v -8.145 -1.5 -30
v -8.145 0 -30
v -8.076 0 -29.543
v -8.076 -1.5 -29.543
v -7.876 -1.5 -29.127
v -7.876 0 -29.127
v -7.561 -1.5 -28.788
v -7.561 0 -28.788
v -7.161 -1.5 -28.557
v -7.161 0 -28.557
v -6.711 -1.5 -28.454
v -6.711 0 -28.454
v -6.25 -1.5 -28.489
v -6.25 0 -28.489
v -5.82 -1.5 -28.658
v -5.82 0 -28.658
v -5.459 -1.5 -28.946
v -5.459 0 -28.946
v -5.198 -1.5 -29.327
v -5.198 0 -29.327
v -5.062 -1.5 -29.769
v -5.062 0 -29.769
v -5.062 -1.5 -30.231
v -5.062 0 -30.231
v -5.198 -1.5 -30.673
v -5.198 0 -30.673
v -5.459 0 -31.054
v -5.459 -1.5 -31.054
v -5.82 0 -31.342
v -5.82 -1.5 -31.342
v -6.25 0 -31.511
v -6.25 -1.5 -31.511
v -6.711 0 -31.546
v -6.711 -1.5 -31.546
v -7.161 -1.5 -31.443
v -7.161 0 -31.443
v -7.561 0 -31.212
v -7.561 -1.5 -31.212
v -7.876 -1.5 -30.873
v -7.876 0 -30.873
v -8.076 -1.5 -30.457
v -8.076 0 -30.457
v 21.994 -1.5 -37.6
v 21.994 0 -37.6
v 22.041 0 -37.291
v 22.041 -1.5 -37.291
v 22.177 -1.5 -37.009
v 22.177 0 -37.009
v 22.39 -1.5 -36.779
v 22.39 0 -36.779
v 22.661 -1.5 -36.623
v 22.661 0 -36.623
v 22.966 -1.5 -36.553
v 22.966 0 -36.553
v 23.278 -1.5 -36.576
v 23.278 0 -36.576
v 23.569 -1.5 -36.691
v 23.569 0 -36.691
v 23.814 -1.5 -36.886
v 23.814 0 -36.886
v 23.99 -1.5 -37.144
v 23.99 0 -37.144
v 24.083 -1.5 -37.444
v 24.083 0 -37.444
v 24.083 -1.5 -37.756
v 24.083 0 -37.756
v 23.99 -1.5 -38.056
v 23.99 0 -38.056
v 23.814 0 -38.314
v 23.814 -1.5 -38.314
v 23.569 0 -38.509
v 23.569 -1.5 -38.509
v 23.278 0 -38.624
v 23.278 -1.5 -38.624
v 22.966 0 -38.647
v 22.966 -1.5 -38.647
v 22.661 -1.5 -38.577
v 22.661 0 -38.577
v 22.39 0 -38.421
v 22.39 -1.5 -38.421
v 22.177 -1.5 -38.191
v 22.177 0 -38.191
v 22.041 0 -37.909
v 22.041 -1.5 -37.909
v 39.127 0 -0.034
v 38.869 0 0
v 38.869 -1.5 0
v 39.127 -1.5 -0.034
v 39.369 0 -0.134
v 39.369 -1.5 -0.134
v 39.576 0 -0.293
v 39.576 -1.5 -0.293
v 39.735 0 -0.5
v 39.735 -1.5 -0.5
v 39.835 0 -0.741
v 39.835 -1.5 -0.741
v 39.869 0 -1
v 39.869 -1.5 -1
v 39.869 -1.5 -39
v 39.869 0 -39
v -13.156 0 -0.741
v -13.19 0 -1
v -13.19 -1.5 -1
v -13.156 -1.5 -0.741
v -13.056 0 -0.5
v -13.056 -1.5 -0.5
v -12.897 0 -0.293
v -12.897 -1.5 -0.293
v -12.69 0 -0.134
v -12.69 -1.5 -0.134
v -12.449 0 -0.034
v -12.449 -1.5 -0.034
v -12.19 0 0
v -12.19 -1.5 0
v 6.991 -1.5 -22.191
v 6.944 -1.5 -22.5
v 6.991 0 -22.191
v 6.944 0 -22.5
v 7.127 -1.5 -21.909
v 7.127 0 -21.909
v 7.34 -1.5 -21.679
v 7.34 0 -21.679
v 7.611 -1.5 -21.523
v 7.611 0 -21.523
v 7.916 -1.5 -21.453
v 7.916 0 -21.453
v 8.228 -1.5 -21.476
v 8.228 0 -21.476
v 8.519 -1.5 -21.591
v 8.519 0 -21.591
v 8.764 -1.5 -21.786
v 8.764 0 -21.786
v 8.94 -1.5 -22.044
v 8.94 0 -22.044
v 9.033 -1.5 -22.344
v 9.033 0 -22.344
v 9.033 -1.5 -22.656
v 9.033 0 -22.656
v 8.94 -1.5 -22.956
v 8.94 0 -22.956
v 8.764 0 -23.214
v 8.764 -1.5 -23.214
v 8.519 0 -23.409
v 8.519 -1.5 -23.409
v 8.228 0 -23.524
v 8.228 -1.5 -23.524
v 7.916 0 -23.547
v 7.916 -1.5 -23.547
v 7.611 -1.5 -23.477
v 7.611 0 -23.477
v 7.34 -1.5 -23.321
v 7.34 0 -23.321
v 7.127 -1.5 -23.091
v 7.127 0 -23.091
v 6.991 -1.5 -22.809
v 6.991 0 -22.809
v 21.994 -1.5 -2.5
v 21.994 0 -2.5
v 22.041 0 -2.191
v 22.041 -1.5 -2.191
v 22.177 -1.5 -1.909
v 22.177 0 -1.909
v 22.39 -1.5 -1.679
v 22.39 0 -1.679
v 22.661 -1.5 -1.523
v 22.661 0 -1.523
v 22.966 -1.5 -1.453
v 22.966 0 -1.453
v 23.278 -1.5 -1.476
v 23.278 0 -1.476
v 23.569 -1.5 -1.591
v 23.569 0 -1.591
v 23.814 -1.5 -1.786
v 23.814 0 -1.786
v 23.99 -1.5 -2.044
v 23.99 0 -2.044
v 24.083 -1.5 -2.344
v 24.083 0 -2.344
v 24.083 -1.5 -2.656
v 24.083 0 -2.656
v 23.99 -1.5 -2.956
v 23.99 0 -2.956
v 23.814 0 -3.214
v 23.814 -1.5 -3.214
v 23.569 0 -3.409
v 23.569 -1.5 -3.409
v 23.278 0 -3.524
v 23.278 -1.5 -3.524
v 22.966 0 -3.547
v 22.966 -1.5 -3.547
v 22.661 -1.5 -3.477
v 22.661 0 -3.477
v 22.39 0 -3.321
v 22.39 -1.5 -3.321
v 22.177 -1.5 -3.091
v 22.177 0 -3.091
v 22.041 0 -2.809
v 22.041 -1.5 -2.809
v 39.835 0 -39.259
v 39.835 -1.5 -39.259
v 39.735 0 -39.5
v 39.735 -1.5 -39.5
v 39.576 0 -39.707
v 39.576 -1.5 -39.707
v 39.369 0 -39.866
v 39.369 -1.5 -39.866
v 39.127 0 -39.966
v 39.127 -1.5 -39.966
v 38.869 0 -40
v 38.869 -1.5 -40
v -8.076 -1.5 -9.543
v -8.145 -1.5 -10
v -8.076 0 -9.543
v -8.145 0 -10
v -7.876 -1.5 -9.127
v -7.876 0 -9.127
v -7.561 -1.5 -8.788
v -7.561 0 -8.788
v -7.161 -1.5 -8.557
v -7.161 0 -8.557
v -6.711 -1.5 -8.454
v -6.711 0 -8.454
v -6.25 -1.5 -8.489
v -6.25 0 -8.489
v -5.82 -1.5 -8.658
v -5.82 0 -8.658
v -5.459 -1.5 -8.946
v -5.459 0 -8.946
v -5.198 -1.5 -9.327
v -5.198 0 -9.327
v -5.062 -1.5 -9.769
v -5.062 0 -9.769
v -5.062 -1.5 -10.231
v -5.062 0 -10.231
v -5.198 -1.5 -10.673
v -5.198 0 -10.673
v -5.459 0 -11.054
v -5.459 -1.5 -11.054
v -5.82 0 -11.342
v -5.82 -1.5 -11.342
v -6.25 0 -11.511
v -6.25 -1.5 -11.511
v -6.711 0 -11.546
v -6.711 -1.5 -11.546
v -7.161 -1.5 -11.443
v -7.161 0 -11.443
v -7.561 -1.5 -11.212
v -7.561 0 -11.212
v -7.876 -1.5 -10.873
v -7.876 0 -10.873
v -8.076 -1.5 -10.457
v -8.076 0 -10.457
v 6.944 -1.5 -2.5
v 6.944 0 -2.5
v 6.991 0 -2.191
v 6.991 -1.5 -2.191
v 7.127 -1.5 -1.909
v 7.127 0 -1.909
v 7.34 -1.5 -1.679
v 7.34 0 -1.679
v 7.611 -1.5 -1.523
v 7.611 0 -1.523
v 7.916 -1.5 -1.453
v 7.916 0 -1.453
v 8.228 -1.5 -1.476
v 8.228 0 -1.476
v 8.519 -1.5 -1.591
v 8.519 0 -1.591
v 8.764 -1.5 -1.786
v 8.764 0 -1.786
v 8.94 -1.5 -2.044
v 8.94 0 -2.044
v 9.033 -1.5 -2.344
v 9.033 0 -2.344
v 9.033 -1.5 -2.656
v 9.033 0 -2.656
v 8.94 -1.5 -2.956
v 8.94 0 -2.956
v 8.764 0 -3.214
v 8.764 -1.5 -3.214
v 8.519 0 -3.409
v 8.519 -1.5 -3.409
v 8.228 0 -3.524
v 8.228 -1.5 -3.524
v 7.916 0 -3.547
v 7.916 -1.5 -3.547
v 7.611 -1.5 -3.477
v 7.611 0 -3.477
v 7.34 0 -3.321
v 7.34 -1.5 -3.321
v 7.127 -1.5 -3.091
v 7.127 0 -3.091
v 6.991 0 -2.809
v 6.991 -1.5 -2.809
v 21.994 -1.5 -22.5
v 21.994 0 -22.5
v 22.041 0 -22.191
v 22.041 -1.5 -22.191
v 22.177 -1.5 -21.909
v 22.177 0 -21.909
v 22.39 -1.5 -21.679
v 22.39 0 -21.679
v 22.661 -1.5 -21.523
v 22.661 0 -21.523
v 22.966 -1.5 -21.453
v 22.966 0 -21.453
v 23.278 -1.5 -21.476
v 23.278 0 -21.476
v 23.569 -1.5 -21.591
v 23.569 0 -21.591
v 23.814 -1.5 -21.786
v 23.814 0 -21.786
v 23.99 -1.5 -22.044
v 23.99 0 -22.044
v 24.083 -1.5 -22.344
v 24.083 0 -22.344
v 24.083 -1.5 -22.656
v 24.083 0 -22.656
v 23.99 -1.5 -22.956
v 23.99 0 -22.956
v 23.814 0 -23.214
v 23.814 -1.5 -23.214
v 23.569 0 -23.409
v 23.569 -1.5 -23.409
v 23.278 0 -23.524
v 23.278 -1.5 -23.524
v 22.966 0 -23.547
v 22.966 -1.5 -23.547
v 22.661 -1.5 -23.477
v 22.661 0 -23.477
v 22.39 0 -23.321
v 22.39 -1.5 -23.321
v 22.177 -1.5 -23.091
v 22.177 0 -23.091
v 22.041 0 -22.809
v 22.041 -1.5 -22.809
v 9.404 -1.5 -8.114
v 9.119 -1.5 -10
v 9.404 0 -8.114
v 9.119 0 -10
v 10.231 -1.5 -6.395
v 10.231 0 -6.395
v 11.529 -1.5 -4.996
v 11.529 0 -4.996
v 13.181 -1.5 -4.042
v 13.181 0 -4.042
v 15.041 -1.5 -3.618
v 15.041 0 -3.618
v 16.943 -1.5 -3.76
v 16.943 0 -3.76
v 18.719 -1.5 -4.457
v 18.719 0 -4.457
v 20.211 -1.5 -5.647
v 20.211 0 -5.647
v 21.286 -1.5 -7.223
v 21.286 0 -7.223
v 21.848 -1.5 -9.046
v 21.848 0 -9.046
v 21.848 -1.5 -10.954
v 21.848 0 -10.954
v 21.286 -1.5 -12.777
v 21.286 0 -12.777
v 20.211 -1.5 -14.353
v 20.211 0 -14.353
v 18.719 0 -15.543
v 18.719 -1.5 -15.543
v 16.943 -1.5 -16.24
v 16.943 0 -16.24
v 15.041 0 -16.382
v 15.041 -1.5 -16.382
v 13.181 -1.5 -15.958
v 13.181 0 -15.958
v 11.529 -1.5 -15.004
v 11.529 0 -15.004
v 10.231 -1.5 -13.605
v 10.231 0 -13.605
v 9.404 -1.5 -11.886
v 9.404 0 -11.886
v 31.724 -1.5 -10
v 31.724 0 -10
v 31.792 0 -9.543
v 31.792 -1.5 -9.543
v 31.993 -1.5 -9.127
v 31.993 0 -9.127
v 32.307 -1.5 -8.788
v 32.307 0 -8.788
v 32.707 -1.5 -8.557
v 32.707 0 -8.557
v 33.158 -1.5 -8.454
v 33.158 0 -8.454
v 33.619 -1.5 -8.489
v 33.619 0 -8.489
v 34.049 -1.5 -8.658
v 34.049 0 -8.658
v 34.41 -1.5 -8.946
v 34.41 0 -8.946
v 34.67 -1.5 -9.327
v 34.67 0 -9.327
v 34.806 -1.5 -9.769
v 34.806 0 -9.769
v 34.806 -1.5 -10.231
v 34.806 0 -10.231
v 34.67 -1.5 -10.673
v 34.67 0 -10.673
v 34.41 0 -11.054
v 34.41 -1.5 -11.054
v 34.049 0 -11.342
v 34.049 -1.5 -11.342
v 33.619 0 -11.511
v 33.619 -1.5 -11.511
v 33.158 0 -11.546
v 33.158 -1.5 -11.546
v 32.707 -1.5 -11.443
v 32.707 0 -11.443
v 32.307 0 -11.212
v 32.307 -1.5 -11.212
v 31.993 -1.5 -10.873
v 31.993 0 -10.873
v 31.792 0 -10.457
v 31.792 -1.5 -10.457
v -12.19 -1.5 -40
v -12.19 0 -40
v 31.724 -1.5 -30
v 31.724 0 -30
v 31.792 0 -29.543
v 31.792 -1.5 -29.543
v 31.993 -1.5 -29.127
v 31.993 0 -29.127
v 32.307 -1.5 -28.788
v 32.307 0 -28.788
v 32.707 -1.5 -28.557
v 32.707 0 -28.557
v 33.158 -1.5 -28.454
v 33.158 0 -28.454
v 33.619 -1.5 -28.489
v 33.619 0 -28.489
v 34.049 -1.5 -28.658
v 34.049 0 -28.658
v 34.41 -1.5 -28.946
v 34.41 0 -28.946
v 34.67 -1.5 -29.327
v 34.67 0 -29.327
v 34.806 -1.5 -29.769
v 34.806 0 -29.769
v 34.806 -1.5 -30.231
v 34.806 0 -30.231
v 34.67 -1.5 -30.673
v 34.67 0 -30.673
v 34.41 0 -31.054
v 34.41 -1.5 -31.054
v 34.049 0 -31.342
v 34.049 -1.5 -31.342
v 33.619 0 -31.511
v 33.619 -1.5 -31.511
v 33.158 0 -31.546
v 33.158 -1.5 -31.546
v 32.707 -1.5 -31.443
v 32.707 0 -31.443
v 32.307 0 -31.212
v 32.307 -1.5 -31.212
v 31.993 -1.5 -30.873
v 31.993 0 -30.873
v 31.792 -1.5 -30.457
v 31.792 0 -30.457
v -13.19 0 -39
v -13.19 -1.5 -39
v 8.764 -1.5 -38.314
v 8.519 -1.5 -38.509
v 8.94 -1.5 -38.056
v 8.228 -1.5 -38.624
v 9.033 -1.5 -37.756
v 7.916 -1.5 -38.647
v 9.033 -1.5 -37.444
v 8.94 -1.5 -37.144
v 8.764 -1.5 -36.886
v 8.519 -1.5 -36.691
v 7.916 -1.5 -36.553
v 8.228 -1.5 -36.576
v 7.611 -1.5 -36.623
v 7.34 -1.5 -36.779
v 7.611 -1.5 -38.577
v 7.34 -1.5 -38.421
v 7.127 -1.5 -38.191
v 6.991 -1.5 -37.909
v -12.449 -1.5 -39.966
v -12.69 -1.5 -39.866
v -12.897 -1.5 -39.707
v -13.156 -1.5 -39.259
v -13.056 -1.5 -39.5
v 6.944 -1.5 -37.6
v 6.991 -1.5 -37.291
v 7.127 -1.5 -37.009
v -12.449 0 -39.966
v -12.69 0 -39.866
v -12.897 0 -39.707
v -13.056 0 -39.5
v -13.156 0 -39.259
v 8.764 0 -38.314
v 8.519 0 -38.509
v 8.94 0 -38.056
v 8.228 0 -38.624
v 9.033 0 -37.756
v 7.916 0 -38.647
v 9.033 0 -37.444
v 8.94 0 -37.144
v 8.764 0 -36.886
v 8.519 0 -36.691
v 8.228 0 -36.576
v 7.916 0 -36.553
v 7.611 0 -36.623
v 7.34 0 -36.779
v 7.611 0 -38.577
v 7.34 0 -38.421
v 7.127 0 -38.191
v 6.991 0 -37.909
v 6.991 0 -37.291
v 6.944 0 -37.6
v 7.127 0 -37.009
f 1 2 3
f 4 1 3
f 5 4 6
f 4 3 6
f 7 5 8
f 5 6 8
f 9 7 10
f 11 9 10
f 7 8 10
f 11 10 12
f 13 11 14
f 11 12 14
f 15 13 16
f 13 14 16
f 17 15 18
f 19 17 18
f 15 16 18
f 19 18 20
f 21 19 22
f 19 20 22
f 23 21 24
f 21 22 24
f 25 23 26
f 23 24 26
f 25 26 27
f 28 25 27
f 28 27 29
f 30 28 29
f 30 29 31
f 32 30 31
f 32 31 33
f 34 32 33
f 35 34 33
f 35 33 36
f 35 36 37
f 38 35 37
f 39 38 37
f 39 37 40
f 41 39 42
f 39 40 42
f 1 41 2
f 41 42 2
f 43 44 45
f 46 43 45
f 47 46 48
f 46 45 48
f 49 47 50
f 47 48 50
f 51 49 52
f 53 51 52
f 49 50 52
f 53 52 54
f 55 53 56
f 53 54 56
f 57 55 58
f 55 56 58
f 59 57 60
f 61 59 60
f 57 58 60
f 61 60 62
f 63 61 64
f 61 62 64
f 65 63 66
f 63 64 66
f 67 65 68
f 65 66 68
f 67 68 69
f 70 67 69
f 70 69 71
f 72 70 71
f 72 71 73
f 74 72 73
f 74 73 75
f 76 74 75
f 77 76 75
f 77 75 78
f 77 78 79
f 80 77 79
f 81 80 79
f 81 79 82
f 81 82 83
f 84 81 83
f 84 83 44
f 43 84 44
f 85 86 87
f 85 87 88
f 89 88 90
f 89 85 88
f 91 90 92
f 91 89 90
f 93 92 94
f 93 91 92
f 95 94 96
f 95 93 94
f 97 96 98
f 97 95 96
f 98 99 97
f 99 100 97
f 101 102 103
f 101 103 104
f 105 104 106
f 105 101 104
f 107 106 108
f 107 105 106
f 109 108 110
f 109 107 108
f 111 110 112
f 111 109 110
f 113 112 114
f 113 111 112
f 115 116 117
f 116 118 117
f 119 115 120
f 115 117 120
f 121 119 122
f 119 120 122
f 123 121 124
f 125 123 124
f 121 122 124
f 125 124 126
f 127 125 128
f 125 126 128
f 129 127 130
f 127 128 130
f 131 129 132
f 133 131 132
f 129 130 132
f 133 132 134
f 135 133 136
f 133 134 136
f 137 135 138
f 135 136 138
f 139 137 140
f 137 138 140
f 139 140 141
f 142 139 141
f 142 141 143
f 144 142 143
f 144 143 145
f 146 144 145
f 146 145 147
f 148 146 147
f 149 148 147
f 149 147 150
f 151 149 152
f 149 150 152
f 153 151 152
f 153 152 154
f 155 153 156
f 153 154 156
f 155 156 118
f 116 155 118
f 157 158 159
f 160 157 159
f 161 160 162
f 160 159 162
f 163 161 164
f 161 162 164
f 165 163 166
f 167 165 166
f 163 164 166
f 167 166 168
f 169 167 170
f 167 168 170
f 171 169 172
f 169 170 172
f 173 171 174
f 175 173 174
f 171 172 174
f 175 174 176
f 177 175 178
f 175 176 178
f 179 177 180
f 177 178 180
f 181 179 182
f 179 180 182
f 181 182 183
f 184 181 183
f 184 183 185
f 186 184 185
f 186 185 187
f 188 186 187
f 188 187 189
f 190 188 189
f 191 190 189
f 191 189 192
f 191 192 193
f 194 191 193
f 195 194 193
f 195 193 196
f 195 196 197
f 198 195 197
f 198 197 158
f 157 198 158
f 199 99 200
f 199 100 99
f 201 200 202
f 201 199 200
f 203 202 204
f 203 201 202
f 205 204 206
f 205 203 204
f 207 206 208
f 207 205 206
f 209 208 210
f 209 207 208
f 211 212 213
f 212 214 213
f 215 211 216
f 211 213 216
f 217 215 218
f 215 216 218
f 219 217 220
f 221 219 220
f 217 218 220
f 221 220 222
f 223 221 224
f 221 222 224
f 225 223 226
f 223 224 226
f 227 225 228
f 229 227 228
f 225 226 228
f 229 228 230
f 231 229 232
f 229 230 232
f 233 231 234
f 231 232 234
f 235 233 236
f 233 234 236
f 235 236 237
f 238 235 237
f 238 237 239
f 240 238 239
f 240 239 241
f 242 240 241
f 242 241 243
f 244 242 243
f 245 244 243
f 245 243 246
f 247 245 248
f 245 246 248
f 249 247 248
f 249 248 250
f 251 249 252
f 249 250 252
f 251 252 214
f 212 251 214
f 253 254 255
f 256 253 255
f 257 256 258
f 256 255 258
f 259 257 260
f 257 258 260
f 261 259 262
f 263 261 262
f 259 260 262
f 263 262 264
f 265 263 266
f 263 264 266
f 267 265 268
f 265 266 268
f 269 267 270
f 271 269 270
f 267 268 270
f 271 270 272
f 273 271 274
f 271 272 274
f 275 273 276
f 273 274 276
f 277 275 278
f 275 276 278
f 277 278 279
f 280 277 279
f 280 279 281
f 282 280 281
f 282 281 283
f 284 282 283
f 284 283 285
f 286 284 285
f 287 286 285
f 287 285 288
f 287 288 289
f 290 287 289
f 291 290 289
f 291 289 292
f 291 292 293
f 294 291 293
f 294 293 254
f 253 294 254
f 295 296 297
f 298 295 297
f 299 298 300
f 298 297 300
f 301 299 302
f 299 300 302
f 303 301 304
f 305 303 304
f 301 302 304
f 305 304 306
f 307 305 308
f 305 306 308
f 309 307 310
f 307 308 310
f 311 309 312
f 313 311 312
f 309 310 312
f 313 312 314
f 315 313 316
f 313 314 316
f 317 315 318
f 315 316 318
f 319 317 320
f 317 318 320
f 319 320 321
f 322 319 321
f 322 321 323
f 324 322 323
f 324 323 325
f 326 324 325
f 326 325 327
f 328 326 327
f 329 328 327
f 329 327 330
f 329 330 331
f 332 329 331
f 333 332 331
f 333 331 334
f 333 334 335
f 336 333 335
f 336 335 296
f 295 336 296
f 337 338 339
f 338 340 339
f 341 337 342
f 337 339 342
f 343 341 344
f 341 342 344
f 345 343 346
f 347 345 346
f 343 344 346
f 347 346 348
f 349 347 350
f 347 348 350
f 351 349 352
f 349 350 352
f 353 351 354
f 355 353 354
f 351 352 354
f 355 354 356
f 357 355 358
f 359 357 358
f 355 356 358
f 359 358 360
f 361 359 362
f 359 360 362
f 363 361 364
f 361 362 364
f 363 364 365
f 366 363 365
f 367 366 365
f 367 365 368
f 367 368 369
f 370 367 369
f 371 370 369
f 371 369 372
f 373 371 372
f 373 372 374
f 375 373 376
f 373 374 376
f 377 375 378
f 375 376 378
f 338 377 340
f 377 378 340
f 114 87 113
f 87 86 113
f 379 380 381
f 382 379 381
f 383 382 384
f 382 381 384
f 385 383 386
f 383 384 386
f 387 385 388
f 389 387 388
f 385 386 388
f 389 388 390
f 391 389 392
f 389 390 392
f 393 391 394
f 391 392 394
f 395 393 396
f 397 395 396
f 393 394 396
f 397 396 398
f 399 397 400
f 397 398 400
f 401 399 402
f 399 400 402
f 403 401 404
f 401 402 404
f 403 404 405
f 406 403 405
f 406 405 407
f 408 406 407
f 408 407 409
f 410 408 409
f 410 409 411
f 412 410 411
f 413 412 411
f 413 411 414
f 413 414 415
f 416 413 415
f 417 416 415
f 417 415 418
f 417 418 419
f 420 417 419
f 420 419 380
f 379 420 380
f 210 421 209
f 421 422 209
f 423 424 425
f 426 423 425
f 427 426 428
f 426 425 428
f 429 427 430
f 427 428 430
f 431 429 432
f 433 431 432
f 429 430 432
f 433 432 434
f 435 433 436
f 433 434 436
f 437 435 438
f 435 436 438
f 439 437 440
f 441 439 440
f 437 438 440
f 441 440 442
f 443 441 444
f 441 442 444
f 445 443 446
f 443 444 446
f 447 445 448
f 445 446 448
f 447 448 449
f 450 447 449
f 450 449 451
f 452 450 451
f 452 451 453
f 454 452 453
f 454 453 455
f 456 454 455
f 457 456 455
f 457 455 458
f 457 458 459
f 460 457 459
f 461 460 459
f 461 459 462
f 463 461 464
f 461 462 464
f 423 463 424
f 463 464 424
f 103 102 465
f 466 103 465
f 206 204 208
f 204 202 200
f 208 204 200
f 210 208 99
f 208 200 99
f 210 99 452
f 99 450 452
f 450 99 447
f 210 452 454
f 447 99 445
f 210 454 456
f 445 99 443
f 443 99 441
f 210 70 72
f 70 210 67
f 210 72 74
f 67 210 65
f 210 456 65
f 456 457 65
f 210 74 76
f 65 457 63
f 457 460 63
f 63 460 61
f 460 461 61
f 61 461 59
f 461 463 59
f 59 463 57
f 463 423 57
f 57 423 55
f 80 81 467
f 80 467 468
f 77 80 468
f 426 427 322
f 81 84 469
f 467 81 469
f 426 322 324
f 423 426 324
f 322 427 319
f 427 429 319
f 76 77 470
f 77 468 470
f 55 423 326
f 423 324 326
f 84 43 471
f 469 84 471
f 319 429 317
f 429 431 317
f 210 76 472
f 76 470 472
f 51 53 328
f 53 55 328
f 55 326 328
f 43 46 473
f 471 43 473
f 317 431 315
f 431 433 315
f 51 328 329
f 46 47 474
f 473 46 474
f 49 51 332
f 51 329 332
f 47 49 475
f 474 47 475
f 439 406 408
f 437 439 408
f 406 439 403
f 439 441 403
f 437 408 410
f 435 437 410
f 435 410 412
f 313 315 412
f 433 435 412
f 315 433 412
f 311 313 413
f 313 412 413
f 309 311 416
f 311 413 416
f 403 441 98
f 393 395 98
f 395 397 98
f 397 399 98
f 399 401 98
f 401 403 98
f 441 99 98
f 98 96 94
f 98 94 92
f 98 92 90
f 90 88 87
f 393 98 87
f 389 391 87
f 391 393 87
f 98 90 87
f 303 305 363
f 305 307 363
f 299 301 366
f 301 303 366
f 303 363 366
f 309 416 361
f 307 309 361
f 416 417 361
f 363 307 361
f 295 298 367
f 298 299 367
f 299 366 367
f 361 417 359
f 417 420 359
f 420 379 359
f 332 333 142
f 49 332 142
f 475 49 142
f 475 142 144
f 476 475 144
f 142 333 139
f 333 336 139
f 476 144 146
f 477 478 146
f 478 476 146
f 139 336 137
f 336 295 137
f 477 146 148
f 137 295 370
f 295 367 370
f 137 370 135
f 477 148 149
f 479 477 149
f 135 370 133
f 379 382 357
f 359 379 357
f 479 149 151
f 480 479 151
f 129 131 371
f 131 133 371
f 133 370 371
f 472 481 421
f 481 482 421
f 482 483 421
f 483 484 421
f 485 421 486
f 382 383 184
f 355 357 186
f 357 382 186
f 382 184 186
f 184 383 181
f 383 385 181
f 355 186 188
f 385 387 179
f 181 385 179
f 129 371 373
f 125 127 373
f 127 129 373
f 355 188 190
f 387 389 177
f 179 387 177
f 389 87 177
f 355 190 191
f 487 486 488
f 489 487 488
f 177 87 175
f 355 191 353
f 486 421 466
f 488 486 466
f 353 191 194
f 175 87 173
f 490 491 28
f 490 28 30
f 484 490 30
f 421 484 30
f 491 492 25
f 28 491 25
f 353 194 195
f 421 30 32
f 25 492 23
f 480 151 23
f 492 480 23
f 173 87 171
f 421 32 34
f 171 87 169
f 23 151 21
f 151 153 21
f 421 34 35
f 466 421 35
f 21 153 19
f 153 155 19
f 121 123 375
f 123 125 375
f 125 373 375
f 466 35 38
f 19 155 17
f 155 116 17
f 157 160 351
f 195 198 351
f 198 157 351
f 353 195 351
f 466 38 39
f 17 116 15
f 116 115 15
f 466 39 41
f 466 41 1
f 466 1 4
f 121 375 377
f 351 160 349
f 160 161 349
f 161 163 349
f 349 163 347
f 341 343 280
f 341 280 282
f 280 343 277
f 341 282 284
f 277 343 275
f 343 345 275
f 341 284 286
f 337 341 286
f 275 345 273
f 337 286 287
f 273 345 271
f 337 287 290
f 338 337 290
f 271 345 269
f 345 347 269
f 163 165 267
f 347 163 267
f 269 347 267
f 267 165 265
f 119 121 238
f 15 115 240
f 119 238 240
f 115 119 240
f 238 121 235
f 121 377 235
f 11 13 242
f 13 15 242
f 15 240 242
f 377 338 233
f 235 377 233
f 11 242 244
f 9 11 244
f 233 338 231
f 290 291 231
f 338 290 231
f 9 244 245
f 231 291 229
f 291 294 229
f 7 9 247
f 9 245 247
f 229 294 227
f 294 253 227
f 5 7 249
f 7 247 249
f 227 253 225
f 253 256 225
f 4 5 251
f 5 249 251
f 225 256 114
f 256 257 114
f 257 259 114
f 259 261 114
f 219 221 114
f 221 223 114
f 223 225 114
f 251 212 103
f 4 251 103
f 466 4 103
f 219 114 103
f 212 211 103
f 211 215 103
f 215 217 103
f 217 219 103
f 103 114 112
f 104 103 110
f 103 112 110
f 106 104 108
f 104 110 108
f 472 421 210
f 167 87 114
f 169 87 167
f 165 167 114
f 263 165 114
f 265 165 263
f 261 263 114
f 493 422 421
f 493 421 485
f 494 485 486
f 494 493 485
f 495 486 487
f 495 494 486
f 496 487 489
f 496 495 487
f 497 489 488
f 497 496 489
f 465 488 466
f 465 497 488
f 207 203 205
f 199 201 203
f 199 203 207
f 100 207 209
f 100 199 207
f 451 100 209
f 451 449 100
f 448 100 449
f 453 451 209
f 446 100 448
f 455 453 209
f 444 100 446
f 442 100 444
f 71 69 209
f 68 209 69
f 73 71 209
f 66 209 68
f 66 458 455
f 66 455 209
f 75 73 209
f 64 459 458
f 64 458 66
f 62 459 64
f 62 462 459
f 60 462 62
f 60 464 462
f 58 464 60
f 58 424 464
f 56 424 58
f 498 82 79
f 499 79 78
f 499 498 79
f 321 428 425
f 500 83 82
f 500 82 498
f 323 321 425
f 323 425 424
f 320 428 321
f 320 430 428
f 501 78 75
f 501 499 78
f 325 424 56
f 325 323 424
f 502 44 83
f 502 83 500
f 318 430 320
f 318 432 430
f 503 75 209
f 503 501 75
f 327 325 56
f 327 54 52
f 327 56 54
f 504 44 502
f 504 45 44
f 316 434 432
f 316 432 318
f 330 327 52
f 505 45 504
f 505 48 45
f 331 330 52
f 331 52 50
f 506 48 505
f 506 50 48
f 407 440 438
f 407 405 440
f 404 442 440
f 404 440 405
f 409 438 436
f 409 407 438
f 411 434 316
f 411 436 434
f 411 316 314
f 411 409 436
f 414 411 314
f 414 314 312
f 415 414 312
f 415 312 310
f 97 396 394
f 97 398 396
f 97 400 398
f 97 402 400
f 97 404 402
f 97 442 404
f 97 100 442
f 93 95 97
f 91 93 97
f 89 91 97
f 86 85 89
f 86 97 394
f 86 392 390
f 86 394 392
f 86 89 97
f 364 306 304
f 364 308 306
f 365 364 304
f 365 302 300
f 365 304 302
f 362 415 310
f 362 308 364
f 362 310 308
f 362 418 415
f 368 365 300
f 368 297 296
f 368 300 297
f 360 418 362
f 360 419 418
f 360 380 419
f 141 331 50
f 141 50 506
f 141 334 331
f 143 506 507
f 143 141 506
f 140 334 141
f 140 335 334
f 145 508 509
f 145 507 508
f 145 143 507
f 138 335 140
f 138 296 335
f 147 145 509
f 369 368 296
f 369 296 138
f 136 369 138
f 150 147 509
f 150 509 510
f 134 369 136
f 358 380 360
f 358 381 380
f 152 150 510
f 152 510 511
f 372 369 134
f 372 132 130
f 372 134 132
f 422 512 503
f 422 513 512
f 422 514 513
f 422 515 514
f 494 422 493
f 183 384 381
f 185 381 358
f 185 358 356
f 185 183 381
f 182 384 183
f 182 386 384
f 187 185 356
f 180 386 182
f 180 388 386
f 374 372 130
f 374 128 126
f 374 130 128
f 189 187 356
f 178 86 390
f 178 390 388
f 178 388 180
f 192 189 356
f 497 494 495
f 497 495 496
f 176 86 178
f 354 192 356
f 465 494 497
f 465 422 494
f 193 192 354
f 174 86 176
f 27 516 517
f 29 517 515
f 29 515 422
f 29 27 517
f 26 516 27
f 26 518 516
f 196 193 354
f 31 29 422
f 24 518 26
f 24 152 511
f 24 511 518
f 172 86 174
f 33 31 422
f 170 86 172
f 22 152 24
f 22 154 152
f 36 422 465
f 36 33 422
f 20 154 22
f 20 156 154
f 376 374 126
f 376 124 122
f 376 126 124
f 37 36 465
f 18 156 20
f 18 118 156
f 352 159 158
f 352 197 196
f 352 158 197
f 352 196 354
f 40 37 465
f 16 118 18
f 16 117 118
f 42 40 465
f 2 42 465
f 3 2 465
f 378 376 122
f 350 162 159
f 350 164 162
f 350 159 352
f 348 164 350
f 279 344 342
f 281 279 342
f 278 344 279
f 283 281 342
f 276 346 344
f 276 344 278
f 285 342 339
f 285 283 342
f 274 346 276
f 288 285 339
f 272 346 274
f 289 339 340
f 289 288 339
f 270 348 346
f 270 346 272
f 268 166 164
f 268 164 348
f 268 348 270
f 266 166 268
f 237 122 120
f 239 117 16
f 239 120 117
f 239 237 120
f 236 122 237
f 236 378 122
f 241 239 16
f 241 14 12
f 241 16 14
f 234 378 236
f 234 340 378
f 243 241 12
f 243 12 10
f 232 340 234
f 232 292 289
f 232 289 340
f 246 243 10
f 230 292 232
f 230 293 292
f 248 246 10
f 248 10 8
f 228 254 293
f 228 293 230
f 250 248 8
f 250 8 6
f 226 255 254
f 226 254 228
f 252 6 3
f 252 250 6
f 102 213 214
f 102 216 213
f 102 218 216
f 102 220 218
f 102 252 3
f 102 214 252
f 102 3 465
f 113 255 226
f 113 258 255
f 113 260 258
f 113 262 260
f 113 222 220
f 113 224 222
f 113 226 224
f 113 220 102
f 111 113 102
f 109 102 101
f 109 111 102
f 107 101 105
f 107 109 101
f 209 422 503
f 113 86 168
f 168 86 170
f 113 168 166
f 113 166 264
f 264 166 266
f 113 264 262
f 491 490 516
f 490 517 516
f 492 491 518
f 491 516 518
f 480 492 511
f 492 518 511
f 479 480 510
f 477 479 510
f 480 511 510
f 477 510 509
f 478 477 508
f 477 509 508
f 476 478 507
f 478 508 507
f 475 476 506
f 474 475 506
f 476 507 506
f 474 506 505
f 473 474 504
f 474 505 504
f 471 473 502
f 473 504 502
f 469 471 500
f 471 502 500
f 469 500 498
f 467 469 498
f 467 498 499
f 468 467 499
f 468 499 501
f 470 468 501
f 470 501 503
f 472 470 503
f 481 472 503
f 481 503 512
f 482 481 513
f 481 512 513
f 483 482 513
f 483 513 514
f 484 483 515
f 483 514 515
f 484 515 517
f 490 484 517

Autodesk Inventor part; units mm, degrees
ref_plane "YZ Plane" through (0, 0, 0) normal (1, 0, 0) x (0, 1, 0)
ref_plane "XZ Plane" through (0, 0, 0) normal (0, 1, 0) x (-1, 0, 0)
ref_plane "XY Plane" through (0, 0, 0) normal (0, 0, 1) x (1, 0, 0)
sketch "Sketch1" plane through (0, 0, 0) normal (0, 1, 0) x (-1, 0, 0)
  line L0 (-26.2289, 0) -> (-26.2289, -40)
  line L1 (-0.4496, -40) -> (-0.4496, 0)
  circle A0 centre (-33.2736, -30) radius 1.55
  circle A1 centre (6.595, -30) radius 1.55
  circle A2 centre (-33.2736, -10) radius 1.55
  circle A3 centre (6.595, -10) radius 1.55
  circle A4 centre (-15.5193, -10) radius 6.4
  circle A5 centre (-23.0443, -37.6) radius 1.05
  circle A6 centre (-7.9943, -37.6) radius 1.05
  circle A7 centre (-23.0443, -22.5) radius 1.05
  circle A8 centre (-7.9943, -22.5) radius 1.05
  circle A9 centre (-23.0443, -2.5) radius 1.05
  circle A10 centre (-7.9943, -2.5) radius 1.05
  arc A11 (13.19, -1) -> (12.19, 0) centre (12.19, -1) ccw
  line L2 (-38.8686, 0) -> (12.19, 0)
  arc A12 (-38.8686, 0) -> (-39.8686, -1) centre (-38.8686, -1) ccw
  line L3 (-39.8686, -39) -> (-39.8686, -1)
  arc A13 (-39.8686, -39) -> (-38.8686, -40) centre (-38.8686, -39) ccw
  arc A14 (12.19, -40) -> (13.19, -39) centre (12.19, -39) ccw
  line L4 (12.19, -40) -> (-38.8686, -40)
  line L5 (13.19, -1) -> (13.19, -39)
  line L6 (-26.6786, -40) -> (-26.6786, 0)
  line L7 (-25.7793, 0) -> (-25.7793, -40)
  line L8 (-0.8993, -40) -> (-0.8993, 0)
  line L9 (0, 0) -> (0, -40)
  point P0 (0, 0)
extrude "Extrusion1" add sketch "Sketch1" against normal blind 1.5
properties part number "body_motor_R_frame"
